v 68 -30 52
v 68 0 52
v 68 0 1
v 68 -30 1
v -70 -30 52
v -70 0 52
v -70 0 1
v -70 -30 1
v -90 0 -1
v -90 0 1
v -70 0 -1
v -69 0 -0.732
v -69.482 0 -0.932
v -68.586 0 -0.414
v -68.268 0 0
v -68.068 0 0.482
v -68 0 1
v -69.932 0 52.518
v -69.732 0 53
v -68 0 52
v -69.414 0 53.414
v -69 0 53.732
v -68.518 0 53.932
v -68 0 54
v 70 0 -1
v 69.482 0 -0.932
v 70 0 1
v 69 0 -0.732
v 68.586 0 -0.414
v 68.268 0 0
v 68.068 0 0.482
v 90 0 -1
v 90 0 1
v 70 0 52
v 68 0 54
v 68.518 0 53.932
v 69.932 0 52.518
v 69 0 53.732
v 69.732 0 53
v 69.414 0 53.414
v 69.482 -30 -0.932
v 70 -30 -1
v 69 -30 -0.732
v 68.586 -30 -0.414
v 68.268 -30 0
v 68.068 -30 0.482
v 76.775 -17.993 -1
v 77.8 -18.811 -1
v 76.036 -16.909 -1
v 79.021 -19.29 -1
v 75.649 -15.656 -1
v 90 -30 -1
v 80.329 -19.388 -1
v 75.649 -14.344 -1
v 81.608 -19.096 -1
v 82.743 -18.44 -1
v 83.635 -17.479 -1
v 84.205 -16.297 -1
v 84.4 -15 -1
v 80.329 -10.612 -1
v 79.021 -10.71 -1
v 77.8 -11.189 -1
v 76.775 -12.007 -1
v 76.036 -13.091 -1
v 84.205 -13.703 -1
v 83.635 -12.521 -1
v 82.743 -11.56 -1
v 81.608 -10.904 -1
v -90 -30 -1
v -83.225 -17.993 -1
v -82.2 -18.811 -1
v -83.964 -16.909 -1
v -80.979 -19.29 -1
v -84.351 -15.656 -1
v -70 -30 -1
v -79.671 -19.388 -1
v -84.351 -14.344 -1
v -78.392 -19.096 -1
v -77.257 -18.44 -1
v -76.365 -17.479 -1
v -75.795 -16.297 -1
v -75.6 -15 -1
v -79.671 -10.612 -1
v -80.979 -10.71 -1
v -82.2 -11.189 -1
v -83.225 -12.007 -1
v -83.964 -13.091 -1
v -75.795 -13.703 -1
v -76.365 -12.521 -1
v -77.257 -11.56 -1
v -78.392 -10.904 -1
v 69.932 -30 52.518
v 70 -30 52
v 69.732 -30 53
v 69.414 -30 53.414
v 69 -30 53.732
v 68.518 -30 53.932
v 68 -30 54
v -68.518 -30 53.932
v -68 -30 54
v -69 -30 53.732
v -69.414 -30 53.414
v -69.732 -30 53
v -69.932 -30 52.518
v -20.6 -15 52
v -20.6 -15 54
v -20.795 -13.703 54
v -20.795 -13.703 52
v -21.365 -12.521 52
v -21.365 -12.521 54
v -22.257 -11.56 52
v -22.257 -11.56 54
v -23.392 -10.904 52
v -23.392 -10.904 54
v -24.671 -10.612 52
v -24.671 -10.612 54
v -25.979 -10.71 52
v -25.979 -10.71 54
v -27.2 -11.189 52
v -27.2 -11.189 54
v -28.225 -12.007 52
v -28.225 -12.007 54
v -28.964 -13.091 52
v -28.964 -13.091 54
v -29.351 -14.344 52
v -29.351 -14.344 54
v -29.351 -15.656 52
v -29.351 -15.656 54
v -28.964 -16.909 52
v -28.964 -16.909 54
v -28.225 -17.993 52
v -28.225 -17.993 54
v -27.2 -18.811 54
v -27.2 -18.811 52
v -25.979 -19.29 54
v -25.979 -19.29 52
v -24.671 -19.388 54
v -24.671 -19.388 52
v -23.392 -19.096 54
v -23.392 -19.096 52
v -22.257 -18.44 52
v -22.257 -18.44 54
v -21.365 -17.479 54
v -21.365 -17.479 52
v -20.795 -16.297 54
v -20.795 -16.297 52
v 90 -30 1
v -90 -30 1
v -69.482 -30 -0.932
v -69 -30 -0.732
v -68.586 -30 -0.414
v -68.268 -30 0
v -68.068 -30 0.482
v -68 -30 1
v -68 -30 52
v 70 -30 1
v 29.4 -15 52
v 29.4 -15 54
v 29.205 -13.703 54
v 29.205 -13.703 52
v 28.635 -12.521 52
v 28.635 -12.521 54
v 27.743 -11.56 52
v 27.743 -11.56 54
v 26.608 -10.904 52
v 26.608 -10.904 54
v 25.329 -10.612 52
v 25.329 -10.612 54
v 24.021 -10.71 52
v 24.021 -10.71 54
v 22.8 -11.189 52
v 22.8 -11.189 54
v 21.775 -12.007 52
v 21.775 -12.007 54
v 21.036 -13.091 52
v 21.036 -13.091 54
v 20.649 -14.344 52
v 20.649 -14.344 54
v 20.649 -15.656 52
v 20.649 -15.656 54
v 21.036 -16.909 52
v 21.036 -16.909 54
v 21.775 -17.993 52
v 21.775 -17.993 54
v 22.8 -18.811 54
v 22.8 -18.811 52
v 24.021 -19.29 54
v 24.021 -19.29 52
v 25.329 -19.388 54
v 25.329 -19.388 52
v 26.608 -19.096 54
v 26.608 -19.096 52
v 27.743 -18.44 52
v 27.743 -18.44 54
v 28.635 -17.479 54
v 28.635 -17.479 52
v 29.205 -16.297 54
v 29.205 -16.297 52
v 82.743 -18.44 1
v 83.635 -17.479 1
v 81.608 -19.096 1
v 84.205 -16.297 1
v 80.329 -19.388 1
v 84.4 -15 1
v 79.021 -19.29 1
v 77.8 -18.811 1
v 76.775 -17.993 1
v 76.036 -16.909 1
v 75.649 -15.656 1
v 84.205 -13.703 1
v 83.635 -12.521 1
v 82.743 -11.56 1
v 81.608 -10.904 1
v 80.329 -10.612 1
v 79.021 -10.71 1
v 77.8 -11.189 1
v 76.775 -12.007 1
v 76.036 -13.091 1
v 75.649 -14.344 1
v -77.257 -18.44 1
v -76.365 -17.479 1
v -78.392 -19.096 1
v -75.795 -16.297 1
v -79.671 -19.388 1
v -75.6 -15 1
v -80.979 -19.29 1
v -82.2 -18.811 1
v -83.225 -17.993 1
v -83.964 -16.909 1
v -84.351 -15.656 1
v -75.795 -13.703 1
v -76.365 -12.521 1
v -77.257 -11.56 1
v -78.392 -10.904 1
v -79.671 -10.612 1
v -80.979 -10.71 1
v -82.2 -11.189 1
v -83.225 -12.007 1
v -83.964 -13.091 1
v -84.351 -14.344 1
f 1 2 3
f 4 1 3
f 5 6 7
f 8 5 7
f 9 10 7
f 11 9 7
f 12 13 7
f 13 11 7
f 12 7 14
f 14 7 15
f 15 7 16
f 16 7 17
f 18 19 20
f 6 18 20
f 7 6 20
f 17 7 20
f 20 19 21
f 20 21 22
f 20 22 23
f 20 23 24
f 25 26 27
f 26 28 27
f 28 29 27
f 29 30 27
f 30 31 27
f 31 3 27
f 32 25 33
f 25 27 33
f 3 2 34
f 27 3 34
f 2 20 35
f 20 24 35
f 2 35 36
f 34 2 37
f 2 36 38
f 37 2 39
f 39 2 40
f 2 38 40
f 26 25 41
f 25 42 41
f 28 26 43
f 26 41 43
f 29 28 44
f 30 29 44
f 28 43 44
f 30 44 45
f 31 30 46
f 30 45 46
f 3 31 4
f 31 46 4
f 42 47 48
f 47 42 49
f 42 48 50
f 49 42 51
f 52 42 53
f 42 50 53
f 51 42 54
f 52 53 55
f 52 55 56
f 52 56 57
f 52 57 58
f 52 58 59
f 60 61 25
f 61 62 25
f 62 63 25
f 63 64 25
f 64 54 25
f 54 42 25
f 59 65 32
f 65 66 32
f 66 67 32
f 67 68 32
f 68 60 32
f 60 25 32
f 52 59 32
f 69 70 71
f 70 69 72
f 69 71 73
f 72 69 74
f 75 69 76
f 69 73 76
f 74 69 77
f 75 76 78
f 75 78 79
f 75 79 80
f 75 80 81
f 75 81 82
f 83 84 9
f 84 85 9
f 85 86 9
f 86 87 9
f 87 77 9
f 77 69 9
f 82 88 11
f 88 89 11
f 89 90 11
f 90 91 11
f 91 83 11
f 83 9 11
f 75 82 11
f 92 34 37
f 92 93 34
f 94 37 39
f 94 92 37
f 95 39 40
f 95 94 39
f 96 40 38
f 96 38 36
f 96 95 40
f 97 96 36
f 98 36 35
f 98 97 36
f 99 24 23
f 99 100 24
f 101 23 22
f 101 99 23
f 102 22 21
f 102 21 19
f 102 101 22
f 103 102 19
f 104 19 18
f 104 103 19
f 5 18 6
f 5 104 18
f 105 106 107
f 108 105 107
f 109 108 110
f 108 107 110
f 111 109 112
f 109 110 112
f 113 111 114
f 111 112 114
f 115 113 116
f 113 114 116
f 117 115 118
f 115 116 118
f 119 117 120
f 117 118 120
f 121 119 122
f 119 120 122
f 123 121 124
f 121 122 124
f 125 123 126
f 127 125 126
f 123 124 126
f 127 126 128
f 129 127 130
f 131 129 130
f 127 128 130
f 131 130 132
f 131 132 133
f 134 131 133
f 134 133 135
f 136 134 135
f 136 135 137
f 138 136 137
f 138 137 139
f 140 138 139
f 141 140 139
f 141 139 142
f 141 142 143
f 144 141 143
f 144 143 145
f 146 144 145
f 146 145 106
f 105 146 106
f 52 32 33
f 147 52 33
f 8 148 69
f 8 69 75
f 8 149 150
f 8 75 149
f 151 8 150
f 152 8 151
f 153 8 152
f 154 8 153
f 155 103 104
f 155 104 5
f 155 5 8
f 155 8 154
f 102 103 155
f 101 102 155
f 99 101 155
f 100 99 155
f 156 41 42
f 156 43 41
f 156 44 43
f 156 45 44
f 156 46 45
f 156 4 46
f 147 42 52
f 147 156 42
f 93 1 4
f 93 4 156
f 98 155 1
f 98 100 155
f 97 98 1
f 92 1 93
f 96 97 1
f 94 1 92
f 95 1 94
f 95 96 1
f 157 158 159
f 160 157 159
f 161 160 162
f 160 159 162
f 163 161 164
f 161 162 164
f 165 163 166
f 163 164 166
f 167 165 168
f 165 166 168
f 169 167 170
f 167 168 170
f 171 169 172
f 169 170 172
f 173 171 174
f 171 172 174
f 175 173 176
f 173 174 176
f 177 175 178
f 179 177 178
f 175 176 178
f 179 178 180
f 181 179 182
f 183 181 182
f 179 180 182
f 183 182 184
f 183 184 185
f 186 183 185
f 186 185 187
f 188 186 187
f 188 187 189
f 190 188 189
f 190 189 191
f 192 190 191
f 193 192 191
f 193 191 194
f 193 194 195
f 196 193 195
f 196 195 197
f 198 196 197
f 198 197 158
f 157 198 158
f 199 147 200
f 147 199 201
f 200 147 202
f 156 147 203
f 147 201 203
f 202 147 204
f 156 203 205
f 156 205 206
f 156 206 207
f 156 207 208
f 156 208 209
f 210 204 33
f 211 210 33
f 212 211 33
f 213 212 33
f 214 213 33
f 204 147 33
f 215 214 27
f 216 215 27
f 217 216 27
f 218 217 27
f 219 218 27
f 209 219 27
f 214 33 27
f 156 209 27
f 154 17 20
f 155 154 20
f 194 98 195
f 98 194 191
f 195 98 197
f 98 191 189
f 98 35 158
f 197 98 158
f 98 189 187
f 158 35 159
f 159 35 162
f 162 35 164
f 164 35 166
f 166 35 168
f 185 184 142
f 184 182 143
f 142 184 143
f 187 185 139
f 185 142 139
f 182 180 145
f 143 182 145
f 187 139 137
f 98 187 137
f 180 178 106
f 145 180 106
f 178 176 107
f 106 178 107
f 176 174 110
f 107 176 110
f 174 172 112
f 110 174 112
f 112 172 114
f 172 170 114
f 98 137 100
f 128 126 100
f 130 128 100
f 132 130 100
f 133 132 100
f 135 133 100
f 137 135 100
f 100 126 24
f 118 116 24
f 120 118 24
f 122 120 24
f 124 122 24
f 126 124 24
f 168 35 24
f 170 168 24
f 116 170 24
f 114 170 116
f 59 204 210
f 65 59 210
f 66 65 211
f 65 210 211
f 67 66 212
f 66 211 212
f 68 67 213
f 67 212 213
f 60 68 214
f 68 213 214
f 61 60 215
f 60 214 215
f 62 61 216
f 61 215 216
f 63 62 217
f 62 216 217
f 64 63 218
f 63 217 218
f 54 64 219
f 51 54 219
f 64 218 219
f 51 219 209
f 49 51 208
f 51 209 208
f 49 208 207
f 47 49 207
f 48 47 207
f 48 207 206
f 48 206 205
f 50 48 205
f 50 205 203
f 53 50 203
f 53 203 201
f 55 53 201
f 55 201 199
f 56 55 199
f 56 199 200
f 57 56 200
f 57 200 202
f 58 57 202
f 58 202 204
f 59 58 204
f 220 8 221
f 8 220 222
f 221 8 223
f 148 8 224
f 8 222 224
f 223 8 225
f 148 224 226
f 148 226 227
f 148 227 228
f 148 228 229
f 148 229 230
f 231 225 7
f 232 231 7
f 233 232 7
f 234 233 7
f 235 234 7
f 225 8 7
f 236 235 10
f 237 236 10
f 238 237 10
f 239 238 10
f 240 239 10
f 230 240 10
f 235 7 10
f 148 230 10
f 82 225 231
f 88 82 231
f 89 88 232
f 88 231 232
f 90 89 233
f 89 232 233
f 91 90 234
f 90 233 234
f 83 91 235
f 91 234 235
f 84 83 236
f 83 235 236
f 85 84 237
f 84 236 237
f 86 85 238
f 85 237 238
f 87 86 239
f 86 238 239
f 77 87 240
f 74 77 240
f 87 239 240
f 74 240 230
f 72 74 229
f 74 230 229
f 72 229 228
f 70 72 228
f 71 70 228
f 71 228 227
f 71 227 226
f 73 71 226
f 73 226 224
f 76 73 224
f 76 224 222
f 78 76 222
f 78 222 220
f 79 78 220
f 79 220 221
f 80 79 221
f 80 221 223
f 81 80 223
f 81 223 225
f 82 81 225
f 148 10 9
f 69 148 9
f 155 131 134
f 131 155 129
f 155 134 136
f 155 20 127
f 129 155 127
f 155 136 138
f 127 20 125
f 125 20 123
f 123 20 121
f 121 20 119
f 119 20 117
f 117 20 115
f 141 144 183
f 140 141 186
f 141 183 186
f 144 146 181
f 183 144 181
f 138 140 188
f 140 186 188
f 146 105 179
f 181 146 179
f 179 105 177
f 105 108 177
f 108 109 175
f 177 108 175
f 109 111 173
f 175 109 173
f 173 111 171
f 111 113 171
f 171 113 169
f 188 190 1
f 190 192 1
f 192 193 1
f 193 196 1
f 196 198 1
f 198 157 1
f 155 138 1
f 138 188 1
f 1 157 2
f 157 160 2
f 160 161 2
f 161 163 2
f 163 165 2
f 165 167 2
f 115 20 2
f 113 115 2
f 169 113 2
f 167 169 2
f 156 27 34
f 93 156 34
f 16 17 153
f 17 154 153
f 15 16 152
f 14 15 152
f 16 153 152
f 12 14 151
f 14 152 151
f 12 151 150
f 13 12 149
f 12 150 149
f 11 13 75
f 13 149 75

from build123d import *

# Parameters (mm, degrees)
F1_DEPTH = 30
F2_R     = 4.4
F3_R     = 4.4
F4_DEPTH = 25
F5_R     = 2
F6_R     = 2


# Not quite as in the source:
# - a feature names something its author has since deleted; it is built from what else it names


with BuildPart() as f1:
    # F0 (on Front) → F1 (new body)
    with BuildSketch(Plane.XZ):
        Polygon((90, -1), (90, 1), (70, 1), (70, 54), (-70, 54), (-70, 1), (-90, 1), (-90, -1), (-68, -1), (-68, 52), (68, 52), (68, -1), align=None)
    extrude(amount=F1_DEPTH)

    # F2 (on face) + F3 (on face) → F4 (cut)
    with BuildSketch(Plane.XY.offset(1)):
        with Locations((-80, -15)):
            Circle(F2_R)
        with Locations((80, -15)):
            Circle(F2_R)
    with BuildSketch(Plane.XY.offset(54)):
        with Locations((-25, -15)):
            Circle(F3_R)
        with Locations((25, -15)):
            Circle(F3_R)
    extrude(amount=-F4_DEPTH, mode=Mode.SUBTRACT)

    # F5
    f5_edges = [f1.edges().sort_by_distance(p)[0] for p in [
        (-70, -15, 54),
        (70, -15, 54),
    ]]
    fillet(f5_edges, radius=F5_R)

    # F6
    f6_edges = [f1.edges().sort_by_distance(p)[0] for p in [
        (68, -15, -1),
        (-68, -15, -1),
    ]]
    fillet(f6_edges, radius=F6_R)


solid = f1.part
